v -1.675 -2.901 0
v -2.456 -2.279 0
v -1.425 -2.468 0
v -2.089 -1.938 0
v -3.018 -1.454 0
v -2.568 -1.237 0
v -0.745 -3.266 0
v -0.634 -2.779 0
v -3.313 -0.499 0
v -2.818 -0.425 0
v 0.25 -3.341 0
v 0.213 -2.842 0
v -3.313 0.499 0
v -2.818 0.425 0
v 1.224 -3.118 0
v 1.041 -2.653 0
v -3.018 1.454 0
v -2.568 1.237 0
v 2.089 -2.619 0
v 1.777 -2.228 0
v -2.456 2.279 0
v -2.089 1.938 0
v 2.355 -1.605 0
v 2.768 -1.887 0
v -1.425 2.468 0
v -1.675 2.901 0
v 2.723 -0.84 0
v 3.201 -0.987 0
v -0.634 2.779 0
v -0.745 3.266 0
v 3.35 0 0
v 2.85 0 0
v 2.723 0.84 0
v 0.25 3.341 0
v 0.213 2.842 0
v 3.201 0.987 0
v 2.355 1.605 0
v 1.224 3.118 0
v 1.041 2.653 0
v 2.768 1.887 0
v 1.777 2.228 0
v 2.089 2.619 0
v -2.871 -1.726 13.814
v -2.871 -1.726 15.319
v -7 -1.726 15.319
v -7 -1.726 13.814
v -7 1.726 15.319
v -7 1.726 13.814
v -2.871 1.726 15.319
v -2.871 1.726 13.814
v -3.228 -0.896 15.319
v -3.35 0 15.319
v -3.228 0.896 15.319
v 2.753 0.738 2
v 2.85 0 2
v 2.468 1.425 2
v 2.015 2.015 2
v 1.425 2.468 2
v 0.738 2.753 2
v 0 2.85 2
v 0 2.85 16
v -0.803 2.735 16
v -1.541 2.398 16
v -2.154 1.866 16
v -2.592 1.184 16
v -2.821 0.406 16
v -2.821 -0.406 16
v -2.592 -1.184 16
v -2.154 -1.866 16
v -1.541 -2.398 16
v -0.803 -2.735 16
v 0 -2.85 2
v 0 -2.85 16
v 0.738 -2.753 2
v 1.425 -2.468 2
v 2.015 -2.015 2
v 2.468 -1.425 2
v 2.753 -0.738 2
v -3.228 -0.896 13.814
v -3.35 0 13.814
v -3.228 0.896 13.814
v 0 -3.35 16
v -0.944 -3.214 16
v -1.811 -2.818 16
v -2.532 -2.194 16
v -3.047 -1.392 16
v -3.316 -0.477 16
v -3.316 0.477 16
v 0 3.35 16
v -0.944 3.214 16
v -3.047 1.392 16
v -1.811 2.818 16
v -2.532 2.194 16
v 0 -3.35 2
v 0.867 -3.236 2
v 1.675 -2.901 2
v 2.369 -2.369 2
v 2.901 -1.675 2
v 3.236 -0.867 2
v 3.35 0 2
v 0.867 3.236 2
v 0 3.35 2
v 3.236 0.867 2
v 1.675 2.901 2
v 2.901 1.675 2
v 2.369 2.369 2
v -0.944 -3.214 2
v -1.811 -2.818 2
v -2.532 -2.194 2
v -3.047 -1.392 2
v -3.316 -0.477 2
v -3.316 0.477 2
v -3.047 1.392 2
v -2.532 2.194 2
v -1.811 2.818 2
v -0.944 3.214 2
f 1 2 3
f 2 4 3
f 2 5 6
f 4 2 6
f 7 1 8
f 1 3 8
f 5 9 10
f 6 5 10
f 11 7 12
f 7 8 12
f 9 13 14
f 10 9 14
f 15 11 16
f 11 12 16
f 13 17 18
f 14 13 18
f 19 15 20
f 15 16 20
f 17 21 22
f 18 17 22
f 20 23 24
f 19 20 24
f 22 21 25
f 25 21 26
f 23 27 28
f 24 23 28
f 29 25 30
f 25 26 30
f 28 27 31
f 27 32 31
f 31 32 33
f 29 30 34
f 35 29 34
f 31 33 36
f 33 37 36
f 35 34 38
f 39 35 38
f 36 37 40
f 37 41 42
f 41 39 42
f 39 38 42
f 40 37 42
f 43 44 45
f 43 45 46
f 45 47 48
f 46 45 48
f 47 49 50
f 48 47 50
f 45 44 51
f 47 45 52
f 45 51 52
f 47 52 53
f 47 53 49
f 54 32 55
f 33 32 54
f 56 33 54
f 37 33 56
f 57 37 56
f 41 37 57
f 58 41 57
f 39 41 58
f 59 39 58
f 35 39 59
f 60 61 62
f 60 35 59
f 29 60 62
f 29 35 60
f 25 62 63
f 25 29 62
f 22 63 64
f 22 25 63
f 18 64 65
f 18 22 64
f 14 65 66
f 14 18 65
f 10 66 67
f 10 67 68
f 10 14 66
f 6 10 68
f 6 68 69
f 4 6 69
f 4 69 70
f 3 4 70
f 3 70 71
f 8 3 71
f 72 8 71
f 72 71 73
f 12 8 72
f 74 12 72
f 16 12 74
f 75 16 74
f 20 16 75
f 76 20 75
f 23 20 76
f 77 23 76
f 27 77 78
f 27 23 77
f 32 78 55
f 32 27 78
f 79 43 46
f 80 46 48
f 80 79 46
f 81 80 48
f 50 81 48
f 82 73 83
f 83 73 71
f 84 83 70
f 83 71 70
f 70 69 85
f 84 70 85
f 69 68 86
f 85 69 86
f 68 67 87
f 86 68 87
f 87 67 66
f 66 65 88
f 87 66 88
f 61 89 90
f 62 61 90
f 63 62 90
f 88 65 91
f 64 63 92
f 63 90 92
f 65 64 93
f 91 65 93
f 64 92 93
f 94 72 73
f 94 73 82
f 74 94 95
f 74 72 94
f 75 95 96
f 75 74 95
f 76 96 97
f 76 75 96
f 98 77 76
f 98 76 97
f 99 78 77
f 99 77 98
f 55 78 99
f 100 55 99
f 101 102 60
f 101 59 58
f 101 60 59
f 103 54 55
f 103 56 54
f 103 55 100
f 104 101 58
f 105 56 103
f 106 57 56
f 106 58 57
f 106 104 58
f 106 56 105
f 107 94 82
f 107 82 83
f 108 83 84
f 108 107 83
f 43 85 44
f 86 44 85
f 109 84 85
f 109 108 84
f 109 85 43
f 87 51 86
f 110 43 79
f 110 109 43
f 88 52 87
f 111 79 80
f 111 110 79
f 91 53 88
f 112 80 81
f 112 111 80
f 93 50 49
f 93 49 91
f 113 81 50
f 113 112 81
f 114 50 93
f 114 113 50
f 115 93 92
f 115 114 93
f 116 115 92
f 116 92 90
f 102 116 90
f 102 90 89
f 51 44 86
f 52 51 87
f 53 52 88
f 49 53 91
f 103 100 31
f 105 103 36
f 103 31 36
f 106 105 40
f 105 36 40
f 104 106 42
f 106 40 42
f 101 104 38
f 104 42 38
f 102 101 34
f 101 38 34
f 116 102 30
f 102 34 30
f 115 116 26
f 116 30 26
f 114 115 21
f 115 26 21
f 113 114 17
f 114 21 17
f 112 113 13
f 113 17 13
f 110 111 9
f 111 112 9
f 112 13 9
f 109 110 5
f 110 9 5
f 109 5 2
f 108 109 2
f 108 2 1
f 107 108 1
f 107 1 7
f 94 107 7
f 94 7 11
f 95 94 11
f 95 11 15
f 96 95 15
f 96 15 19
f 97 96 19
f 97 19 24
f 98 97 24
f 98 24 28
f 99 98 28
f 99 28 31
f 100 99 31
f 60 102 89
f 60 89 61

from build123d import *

# Parameters (mm, degrees)
ESQUISSE1_R             = 3.35
ESQUISSE1_R_2           = 2.85
BOSS_EXTRU_1_DEPTH      = 2
BOSS_EXTRU_2_DEPTH      = 14
ESQUISSE3_W             = 1.505412516
ESQUISSE3_H             = 3.452066632
BOSS_EXTRU_3_DEPTH      = 7
ENL_V_START             = -5
ESQUISSE4_R             = 2.85
ENL_V_MAT_EXTRU_1_DEPTH = 5


with BuildPart() as part:
    # Esquisse1 → Boss.-Extru.1 (new body)
    with BuildSketch(Plane.XY):
        Circle(ESQUISSE1_R)
        Circle(ESQUISSE1_R_2, mode=Mode.SUBTRACT)
    extrude(amount=BOSS_EXTRU_1_DEPTH)

    # Esquisse2 → Boss.-Extru.2 (add)
    with BuildSketch(Plane.XY.offset(2)):
        with BuildLine():
            Line((0, 3.35), (0, 2.85))
            ThreePointArc((0, 2.85), (-2.85, 0), (0, -2.85))
            Line((0, -2.85), (0, -3.35))
            ThreePointArc((0, -3.35), (-3.35, 0), (0, 3.35))
        make_face()
    extrude(amount=BOSS_EXTRU_2_DEPTH)

    # Esquisse3 → Boss.-Extru.3 (add)
    with BuildSketch(Plane(origin=(0, 0, 0), x_dir=(0, 0, -1), z_dir=(1, 0, 0))):
        with Locations((-14.566713218, 0)):
            Rectangle(ESQUISSE3_W, ESQUISSE3_H)
    extrude(amount=-BOSS_EXTRU_3_DEPTH)

    # Esquisse4 → Enlèv. mat.-Extru.1 (cut)
    with BuildSketch(Plane.XY.offset(16).offset(ENL_V_START)):
        with Locations(Location((0, 0, 0), (0, 0, 90))):
            Circle(ESQUISSE4_R)
    extrude(amount=ENL_V_MAT_EXTRU_1_DEPTH, mode=Mode.SUBTRACT)


solid = part.part
